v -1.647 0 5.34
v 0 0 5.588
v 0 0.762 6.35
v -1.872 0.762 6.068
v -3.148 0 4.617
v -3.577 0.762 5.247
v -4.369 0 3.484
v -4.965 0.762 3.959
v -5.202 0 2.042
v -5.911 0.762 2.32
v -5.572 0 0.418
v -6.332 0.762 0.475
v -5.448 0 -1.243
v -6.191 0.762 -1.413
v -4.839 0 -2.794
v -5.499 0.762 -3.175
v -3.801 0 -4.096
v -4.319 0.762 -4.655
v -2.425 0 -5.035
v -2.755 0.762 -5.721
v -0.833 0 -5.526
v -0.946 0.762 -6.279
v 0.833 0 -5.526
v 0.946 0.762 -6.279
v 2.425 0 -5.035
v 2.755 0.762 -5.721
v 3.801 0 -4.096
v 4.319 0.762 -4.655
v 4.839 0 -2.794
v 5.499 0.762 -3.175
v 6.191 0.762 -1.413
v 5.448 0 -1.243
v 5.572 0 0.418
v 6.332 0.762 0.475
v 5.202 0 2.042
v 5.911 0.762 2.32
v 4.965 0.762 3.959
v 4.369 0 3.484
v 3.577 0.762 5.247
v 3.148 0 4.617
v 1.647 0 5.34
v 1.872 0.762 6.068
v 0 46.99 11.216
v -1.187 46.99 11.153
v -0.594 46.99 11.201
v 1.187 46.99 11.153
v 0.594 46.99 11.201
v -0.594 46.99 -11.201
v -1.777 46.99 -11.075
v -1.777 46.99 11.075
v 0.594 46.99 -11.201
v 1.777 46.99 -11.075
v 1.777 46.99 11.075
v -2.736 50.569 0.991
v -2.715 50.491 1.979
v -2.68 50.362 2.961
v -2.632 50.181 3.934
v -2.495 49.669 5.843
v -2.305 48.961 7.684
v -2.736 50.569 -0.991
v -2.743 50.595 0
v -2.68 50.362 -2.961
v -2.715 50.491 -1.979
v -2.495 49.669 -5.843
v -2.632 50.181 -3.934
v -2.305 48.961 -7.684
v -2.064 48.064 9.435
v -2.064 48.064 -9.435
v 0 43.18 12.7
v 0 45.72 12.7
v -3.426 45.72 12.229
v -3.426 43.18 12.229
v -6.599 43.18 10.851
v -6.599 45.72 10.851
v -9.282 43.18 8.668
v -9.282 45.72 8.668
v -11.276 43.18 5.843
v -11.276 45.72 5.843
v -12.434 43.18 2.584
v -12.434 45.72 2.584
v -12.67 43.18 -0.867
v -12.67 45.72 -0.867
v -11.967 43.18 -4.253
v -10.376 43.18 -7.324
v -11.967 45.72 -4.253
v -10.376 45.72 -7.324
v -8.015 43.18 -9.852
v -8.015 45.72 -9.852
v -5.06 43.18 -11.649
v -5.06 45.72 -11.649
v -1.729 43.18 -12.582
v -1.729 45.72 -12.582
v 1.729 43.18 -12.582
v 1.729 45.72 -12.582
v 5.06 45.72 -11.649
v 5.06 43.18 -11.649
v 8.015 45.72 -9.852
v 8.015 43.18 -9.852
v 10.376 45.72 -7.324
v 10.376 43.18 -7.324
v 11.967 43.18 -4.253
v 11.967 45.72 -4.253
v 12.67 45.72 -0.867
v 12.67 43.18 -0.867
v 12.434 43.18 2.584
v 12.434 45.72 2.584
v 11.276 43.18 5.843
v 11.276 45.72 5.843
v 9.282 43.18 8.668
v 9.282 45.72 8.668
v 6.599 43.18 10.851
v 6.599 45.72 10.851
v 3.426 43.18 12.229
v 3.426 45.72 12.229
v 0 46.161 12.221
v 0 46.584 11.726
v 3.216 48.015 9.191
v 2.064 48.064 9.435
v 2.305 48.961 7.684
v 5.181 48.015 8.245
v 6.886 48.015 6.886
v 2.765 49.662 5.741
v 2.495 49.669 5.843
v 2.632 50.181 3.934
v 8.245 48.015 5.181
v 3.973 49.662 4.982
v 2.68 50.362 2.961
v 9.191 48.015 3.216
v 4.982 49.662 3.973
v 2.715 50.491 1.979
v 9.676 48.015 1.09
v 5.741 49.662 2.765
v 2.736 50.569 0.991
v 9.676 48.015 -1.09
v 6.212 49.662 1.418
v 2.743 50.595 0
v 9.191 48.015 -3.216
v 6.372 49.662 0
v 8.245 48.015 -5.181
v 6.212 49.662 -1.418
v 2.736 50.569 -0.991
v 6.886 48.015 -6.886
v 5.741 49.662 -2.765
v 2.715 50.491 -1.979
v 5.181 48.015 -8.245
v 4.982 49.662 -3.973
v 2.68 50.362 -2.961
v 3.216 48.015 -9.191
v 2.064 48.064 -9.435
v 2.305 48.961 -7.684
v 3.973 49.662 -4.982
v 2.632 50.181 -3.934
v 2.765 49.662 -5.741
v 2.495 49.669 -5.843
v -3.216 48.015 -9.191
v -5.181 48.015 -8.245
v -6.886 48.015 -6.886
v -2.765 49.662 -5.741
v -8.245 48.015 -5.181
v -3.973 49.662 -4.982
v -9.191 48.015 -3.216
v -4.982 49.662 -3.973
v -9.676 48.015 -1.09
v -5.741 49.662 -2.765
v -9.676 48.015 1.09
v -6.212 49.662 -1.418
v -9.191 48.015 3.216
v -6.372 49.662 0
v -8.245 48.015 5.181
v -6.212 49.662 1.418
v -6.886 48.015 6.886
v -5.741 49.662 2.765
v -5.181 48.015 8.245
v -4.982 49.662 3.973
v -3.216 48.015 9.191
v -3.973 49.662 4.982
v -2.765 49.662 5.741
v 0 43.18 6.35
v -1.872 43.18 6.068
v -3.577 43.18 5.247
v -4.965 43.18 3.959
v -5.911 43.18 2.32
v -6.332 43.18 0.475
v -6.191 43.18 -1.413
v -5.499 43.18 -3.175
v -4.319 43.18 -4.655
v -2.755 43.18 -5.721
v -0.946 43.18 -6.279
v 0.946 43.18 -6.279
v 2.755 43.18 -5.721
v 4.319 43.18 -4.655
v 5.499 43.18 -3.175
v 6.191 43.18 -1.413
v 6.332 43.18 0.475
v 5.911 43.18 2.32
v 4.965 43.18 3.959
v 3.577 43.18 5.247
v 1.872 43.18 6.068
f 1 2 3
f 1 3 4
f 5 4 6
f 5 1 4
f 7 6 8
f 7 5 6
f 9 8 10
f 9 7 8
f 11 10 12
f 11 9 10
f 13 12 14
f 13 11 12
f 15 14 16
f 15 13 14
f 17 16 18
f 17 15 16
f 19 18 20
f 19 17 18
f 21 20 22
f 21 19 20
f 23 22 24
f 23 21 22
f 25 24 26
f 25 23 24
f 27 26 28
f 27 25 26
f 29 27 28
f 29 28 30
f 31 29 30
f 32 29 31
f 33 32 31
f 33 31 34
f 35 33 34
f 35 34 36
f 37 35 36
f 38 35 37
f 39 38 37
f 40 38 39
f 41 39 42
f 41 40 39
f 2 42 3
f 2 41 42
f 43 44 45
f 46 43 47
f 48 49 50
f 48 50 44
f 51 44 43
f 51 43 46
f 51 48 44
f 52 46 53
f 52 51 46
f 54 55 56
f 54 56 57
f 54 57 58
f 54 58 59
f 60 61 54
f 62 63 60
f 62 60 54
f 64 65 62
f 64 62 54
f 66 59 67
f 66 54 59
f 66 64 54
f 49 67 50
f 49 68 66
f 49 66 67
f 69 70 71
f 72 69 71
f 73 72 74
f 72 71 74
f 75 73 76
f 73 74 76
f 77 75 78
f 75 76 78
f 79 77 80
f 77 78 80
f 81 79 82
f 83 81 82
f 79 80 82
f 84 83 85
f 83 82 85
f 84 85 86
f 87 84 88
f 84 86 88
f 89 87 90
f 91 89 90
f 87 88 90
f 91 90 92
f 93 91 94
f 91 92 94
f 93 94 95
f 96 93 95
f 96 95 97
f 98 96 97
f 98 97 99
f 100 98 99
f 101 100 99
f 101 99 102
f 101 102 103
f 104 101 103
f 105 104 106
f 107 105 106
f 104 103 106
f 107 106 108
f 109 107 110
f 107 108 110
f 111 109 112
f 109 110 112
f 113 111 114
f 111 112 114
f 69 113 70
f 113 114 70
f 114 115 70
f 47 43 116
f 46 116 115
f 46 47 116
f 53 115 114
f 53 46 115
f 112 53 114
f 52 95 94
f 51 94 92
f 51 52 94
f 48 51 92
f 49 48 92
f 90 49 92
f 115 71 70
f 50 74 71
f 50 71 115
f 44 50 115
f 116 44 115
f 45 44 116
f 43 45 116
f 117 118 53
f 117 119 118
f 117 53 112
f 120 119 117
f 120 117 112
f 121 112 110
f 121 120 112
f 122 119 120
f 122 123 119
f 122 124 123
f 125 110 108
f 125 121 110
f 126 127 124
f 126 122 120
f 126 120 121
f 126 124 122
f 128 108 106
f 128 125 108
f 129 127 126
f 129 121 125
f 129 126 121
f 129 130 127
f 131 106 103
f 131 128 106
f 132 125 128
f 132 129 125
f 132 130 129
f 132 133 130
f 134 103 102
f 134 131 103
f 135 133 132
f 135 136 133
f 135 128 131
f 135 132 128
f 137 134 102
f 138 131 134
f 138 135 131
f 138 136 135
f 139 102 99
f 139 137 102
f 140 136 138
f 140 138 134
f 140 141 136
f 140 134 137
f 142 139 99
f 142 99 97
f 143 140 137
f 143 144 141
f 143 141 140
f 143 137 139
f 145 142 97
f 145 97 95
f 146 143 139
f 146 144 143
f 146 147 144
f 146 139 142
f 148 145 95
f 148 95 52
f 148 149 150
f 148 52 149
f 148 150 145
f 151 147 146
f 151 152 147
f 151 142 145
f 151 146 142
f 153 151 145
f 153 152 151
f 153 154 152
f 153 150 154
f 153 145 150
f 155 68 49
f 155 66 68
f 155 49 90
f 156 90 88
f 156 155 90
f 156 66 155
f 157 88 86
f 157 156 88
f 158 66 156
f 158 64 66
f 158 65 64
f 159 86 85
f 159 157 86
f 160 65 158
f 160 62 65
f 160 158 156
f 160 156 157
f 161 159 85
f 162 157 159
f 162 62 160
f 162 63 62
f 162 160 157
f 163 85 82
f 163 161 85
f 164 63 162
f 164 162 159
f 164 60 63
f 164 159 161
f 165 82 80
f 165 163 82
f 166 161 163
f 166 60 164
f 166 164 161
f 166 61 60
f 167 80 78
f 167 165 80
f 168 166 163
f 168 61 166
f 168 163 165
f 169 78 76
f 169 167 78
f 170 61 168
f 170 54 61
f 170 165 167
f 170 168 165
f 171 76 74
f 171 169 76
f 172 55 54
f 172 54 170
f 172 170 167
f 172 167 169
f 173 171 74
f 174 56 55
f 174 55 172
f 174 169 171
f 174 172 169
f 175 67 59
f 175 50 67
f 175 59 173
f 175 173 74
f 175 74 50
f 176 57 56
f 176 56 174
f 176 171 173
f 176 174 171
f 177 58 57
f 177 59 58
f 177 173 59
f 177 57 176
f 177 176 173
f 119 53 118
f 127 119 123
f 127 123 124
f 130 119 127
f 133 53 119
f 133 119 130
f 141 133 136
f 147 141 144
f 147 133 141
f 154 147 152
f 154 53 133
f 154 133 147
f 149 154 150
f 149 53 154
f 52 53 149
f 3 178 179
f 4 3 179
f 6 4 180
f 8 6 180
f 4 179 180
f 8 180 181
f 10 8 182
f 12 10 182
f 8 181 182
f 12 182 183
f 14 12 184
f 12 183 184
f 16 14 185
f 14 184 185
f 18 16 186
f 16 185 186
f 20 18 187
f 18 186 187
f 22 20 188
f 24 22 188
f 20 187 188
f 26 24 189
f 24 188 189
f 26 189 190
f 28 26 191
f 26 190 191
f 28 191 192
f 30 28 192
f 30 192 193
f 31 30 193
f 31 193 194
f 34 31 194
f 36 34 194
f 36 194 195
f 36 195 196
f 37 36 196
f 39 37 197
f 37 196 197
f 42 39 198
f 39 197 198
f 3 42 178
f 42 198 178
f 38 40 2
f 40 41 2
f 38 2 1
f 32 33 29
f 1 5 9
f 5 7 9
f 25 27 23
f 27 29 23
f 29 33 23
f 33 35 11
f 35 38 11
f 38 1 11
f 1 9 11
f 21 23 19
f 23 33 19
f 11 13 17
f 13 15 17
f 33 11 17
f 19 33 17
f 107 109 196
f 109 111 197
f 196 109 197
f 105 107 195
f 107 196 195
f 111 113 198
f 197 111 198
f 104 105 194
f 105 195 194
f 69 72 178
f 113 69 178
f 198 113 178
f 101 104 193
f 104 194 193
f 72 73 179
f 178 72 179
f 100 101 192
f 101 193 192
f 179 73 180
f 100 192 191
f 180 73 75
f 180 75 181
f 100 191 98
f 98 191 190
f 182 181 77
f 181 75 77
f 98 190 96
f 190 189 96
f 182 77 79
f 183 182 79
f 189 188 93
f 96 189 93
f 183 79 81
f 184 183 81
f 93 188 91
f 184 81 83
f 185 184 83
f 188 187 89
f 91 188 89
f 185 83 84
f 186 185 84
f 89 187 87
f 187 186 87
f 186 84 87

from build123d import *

# Parameters (mm, degrees)
DOME1_FACE_RADIUS       = 12.7
DOME1_HEIGHT            = 5.08
CUT_EXTRUDE2_DEPTH      = 54.881536726
CUT_EXTRUDE2_DEPTH_BACK = 54.881536726
CHAMFER1_SIZE           = 0.762


with BuildPart() as part:
    # Sketch5 → Revolve2 (revolve)
    with BuildSketch(Plane.XY, mode=Mode.PRIVATE) as revolve2_sk:
        Polygon((0, 0), (-6.35, 0), (-6.35, 43.18), (-12.7, 43.18), (-12.7, 45.72), (0, 45.72), (0, 43.18), align=None)
    revolve(revolve2_sk.sketch.rotate(Axis((0, 0, 0), (0, -1, 0)), 270), axis=Axis((0, 0, 0), (0, -1, 0)))

    # Dome1: a dome of height H over a round flat face of radius A is a cap of a sphere of radius (A * A + H * H) / (2 * H)
    dome1_r = (DOME1_FACE_RADIUS * DOME1_FACE_RADIUS + DOME1_HEIGHT * DOME1_HEIGHT) / (2 * DOME1_HEIGHT)
    dome1_base = Plane((0, 45.72, 0), z_dir=(0, 1, 0))
    with Locations(dome1_base.offset(DOME1_HEIGHT - dome1_r)):
        dome1_ball = Sphere(dome1_r, mode=Mode.PRIVATE)
    add(split(dome1_ball, bisect_by=dome1_base, keep=Keep.TOP, mode=Mode.PRIVATE))

    # Sketch7 → Cut-Extrude2 (cut, two sides: drawn at the far end of the back side and taken through both)
    with BuildSketch(Plane.XY.offset(-CUT_EXTRUDE2_DEPTH_BACK)):
        Polygon((-32.713179339, 162.446628615), (-2.742527685, 50.594633903), (-1.776668941, 46.99), (1.776668941, 46.99), (2.742527685, 50.594633903), (32.713179339, 162.446628615), (32.713179339, 394.042040328), (-32.713179339, 394.042040328), align=None)
    extrude(amount=CUT_EXTRUDE2_DEPTH + CUT_EXTRUDE2_DEPTH_BACK, mode=Mode.SUBTRACT)

    # Chamfer1
    chamfer1_edges = [part.edges().sort_by_distance(p)[0] for p in [
        (0, 0, -6.35),
    ]]
    chamfer(chamfer1_edges, length=CHAMFER1_SIZE)


solid = part.part
